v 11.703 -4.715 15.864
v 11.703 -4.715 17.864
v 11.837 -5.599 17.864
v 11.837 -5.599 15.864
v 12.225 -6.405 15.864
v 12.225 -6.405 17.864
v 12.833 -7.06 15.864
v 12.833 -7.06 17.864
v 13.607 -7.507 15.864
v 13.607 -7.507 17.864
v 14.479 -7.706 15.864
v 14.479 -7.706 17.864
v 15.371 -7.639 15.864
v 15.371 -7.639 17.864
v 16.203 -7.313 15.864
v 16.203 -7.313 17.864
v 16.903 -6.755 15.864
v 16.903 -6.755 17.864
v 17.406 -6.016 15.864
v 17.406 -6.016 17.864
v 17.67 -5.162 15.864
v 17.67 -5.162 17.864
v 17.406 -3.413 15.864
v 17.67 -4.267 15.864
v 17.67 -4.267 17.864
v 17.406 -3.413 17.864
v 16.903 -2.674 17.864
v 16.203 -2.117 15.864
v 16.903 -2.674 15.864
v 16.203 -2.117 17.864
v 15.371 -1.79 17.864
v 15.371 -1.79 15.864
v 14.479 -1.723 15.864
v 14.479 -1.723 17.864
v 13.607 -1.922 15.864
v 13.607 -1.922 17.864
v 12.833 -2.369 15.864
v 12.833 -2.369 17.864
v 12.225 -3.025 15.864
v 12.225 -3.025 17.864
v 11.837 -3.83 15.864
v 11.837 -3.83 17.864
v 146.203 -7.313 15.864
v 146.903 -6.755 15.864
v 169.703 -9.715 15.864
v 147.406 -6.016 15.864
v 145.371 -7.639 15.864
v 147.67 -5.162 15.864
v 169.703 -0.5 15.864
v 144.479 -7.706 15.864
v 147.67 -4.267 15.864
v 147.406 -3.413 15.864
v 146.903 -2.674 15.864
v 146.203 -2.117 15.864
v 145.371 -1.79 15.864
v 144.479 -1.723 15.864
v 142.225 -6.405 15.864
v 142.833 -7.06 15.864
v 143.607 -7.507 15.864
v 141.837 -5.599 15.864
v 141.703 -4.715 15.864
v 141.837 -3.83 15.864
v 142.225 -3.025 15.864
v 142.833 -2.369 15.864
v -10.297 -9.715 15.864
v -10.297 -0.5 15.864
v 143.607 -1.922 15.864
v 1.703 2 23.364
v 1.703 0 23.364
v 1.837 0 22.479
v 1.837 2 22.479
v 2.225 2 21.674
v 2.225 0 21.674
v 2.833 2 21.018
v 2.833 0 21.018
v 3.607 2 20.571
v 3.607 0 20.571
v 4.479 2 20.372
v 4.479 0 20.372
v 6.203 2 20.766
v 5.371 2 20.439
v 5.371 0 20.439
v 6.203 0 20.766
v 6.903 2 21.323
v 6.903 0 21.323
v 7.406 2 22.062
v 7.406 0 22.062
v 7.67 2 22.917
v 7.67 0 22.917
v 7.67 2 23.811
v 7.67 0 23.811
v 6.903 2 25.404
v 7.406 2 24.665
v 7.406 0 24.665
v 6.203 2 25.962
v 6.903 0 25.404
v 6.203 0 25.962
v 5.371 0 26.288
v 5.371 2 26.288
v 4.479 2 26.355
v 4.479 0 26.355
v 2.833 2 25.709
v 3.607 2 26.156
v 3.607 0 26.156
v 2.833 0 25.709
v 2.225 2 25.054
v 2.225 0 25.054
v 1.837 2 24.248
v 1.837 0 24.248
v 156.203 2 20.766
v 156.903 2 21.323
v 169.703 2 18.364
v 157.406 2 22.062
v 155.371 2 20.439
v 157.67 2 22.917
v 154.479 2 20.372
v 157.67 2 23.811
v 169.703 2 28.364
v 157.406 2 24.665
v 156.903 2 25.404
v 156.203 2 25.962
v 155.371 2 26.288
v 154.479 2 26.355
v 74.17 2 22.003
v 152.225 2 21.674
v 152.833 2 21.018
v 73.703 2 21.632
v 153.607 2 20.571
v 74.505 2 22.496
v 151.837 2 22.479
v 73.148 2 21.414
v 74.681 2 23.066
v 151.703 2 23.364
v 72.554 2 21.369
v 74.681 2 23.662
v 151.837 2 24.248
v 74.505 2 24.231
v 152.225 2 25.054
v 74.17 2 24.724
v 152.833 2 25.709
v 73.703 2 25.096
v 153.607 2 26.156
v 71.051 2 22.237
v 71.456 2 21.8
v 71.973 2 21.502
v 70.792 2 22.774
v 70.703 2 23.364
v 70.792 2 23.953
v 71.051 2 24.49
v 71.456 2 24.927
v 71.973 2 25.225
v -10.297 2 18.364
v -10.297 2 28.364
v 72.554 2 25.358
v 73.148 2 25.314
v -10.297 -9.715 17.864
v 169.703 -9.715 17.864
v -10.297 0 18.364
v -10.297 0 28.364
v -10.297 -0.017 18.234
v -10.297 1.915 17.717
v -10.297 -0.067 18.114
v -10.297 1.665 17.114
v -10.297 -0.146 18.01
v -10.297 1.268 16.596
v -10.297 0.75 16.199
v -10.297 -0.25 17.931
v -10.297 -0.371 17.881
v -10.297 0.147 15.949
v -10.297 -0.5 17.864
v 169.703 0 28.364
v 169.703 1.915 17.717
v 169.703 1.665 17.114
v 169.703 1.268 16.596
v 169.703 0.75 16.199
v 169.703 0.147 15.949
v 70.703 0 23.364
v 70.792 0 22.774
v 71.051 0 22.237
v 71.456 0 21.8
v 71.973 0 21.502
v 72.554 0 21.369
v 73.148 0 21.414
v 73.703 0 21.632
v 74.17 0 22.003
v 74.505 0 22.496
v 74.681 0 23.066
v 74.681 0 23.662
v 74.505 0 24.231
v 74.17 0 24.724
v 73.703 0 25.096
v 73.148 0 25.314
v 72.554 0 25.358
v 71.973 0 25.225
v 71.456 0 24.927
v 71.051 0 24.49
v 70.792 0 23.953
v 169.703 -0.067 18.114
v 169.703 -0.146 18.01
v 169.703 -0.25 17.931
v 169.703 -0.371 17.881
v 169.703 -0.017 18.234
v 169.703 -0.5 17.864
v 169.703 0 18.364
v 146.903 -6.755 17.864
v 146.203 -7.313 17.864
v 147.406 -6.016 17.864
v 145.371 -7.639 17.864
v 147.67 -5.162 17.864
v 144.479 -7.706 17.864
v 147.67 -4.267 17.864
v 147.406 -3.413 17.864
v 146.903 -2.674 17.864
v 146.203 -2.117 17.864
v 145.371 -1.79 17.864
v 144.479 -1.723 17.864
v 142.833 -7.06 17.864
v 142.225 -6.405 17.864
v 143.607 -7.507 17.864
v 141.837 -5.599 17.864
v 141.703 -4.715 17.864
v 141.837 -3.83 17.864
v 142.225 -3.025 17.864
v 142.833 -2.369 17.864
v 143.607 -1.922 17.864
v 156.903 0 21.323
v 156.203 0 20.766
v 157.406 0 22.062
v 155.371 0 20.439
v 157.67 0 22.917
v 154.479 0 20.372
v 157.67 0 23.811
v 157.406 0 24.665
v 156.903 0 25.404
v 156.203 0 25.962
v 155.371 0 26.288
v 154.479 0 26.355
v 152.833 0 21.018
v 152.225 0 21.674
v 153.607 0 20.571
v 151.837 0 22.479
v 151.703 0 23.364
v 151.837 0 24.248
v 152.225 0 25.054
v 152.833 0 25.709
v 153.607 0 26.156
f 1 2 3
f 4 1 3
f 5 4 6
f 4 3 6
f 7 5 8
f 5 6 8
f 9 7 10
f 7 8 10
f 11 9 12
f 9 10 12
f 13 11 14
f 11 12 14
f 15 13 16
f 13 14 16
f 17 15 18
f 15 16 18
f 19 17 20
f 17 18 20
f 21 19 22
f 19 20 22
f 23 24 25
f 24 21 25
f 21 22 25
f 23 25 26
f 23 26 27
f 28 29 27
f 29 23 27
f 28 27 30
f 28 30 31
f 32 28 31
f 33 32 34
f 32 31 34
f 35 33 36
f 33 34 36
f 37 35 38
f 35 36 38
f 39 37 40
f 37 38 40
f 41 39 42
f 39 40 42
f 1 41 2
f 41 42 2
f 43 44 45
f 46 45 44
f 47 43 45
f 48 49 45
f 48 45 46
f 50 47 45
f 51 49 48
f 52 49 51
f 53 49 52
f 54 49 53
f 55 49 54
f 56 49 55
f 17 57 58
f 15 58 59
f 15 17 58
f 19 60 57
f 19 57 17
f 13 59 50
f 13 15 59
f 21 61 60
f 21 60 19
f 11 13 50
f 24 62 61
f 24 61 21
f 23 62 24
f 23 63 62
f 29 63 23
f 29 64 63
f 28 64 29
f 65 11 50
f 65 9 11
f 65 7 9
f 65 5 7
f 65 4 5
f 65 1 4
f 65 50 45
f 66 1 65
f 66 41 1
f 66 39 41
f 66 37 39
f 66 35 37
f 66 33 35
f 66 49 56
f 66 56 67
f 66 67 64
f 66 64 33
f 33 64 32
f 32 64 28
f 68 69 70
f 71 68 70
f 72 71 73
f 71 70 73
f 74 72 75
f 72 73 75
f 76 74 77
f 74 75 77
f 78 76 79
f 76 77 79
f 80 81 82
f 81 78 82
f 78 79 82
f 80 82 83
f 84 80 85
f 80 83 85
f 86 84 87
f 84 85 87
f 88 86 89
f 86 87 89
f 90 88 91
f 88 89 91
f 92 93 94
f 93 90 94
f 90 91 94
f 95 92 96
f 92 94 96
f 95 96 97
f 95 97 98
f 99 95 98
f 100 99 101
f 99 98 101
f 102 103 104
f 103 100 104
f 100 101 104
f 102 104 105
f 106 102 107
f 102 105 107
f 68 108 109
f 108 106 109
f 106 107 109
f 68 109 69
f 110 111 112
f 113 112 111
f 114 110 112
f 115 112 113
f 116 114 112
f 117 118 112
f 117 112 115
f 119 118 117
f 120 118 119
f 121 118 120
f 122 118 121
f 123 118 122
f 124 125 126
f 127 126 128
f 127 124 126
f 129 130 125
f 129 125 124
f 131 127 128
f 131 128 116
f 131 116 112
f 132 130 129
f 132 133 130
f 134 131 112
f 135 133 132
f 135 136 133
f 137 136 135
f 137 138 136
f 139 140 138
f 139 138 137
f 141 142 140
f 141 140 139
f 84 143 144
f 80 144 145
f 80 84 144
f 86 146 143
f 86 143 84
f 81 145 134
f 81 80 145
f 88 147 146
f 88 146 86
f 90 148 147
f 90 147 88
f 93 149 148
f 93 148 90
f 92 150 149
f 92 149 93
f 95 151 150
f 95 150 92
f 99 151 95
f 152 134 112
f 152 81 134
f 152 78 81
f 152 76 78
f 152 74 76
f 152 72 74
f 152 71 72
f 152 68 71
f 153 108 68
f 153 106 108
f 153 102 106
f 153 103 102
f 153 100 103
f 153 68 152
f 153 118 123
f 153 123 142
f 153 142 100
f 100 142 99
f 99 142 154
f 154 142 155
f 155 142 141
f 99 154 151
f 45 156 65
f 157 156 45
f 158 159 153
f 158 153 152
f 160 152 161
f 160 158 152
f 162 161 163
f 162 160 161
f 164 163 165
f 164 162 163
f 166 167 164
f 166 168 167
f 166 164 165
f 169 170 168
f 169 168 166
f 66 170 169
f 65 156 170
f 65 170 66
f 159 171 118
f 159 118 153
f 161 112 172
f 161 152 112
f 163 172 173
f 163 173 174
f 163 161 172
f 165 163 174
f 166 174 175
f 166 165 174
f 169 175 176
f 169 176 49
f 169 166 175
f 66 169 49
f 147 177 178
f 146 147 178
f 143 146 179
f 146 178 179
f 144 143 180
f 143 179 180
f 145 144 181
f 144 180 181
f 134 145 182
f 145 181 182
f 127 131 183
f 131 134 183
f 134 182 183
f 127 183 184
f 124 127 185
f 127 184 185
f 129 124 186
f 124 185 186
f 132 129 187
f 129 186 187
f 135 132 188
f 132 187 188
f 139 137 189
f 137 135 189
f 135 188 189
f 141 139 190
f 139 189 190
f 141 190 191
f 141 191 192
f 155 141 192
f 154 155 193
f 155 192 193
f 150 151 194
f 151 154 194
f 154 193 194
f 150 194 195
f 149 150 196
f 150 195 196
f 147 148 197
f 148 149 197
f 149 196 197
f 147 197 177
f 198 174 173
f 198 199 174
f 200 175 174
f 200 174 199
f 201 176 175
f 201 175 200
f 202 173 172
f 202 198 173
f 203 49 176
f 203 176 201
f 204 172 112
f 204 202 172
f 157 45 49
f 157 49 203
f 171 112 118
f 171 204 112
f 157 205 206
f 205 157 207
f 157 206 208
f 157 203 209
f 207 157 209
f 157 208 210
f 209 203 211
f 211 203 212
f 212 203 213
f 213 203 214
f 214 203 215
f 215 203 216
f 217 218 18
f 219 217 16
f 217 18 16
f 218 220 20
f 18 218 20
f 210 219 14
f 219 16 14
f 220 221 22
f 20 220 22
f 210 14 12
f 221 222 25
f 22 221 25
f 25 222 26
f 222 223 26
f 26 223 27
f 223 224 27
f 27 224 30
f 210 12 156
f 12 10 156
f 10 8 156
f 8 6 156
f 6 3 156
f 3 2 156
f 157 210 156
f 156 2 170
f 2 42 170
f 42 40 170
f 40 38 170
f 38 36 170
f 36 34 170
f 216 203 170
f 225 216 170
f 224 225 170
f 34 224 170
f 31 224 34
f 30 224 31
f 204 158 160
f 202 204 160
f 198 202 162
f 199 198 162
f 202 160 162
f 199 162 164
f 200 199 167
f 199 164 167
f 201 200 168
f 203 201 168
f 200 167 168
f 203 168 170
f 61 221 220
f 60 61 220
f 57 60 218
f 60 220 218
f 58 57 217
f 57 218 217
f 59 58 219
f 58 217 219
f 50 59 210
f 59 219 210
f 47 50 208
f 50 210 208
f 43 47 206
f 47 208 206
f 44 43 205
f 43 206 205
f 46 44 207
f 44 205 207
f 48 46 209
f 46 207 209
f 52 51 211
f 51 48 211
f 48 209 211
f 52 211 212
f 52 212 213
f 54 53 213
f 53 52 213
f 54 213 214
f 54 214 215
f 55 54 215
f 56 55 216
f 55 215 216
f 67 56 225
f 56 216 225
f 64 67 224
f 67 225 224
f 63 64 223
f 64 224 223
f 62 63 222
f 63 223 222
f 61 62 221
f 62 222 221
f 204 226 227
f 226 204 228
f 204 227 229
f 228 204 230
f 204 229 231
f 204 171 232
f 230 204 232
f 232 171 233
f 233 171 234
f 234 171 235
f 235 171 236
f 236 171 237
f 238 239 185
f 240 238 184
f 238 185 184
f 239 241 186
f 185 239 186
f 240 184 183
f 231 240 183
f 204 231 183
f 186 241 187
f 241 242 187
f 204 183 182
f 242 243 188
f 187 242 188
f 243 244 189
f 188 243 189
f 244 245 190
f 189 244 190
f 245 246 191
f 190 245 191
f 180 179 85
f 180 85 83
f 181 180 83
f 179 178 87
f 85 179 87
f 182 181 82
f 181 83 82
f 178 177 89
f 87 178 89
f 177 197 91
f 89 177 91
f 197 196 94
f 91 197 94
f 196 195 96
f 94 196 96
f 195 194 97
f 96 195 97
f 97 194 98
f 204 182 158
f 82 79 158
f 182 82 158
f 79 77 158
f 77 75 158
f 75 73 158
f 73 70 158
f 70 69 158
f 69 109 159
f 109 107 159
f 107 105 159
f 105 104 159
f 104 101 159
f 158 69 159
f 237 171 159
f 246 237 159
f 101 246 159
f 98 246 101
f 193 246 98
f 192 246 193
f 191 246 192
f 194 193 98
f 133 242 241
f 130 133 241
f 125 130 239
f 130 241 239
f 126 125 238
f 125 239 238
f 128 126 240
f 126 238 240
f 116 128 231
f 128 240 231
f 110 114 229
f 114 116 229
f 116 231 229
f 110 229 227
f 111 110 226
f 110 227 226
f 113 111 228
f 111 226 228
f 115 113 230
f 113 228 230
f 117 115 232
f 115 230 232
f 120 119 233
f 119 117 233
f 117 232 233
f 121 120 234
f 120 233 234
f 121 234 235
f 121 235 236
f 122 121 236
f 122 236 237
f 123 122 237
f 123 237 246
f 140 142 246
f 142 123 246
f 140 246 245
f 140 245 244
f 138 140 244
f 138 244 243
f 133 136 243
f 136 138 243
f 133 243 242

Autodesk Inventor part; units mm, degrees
ref_plane "YZ Plane" through (0, 0, 0) normal (1, 0, 0) x (0, 1, 0)
ref_plane "XZ Plane" through (0, 0, 0) normal (0, 1, 0) x (-1, 0, 0)
ref_plane "XY Plane" through (0, 0, 0) normal (0, 0, 1) x (1, 0, 0)
sketch "Boceto5" plane through (0, 0, 0) normal (0, 1, 0) x (-1, 0, 0)
  line L0 (10.2966, 28.3637) -> (10.2966, 8.3637)
  line L1 (10.2966, 8.3637) -> (-169.7034, 8.3637)
  line L2 (-169.7034, 8.3637) -> (-169.7034, 28.3637)
  line L3 (-169.7034, 28.3637) -> (10.2966, 28.3637)
  line L4 (10.2966, 18.3637) -> (-169.7034, 18.3637)
  circle A0 centre (-154.7034, 23.3637) radius 3
  circle A1 centre (-4.7034, 23.3637) radius 3
  circle A2 centre (-14.7034, 13.3637) radius 3
  circle A3 centre (-144.7034, 13.3637) radius 3
  circle A4 centre (-72.7034, 23.3637) radius 2
  point P0 (0, 0)
  dimension "d33" = 20
  dimension "d34" = 180
  dimension "d35" = 20
  dimension "d36" = 6
  dimension "d37" = 6
  dimension "d38" = 6
  dimension "d39" = 6
  dimension "d40" = 150
  dimension "d41" = 130
  dimension "d42" = 15
  dimension "d43" = 25
  dimension "d44" = 5
  dimension "d45" = 5
  dimension "d46" = 5
  dimension "d47" = 5
  dimension "d54" = 4
  dimension "d56" = 5
  dimension "d57" = 83
extrude "Extrusión4" add sketch "Boceto5" along normal blind 2 contours L0 L1 L2 L4
extrude "Extrusión5" add sketch "Boceto5" along normal blind 2 contours L0 L4 L2 L3
bend part "Pieza de plegado1" radius 0.5 angle 90 line through (-10.2966, 0, 18.3637) along (1, 0, 0) centre toward (0, -1, 0) moving side (0, 0, -1) both sides no
equation "\"Radio_pliegue\" = Grosor"
equation "\"Anchura_desahogo_plegado\" = Grosor"
equation "\"Profundidad_desahogo_plegado\" = 0.5 * Grosor"
equation "\"Tamaño_destalonado\" = 4 * Grosor"
equation "\"Remanente_mínimo\" = 2 * Grosor"
equation "\"Radiodetransición\" = Radio_pliegue"
equation "\"Tamaño_de_radio_de_Jacobi\" = Grosor"
equation "\"TamañoSeparación\" = Grosor"
equation "\"Grosor\" = 0.5"
properties part number "Soporte en L Frontal" material "Aluminum 1100-H14"
